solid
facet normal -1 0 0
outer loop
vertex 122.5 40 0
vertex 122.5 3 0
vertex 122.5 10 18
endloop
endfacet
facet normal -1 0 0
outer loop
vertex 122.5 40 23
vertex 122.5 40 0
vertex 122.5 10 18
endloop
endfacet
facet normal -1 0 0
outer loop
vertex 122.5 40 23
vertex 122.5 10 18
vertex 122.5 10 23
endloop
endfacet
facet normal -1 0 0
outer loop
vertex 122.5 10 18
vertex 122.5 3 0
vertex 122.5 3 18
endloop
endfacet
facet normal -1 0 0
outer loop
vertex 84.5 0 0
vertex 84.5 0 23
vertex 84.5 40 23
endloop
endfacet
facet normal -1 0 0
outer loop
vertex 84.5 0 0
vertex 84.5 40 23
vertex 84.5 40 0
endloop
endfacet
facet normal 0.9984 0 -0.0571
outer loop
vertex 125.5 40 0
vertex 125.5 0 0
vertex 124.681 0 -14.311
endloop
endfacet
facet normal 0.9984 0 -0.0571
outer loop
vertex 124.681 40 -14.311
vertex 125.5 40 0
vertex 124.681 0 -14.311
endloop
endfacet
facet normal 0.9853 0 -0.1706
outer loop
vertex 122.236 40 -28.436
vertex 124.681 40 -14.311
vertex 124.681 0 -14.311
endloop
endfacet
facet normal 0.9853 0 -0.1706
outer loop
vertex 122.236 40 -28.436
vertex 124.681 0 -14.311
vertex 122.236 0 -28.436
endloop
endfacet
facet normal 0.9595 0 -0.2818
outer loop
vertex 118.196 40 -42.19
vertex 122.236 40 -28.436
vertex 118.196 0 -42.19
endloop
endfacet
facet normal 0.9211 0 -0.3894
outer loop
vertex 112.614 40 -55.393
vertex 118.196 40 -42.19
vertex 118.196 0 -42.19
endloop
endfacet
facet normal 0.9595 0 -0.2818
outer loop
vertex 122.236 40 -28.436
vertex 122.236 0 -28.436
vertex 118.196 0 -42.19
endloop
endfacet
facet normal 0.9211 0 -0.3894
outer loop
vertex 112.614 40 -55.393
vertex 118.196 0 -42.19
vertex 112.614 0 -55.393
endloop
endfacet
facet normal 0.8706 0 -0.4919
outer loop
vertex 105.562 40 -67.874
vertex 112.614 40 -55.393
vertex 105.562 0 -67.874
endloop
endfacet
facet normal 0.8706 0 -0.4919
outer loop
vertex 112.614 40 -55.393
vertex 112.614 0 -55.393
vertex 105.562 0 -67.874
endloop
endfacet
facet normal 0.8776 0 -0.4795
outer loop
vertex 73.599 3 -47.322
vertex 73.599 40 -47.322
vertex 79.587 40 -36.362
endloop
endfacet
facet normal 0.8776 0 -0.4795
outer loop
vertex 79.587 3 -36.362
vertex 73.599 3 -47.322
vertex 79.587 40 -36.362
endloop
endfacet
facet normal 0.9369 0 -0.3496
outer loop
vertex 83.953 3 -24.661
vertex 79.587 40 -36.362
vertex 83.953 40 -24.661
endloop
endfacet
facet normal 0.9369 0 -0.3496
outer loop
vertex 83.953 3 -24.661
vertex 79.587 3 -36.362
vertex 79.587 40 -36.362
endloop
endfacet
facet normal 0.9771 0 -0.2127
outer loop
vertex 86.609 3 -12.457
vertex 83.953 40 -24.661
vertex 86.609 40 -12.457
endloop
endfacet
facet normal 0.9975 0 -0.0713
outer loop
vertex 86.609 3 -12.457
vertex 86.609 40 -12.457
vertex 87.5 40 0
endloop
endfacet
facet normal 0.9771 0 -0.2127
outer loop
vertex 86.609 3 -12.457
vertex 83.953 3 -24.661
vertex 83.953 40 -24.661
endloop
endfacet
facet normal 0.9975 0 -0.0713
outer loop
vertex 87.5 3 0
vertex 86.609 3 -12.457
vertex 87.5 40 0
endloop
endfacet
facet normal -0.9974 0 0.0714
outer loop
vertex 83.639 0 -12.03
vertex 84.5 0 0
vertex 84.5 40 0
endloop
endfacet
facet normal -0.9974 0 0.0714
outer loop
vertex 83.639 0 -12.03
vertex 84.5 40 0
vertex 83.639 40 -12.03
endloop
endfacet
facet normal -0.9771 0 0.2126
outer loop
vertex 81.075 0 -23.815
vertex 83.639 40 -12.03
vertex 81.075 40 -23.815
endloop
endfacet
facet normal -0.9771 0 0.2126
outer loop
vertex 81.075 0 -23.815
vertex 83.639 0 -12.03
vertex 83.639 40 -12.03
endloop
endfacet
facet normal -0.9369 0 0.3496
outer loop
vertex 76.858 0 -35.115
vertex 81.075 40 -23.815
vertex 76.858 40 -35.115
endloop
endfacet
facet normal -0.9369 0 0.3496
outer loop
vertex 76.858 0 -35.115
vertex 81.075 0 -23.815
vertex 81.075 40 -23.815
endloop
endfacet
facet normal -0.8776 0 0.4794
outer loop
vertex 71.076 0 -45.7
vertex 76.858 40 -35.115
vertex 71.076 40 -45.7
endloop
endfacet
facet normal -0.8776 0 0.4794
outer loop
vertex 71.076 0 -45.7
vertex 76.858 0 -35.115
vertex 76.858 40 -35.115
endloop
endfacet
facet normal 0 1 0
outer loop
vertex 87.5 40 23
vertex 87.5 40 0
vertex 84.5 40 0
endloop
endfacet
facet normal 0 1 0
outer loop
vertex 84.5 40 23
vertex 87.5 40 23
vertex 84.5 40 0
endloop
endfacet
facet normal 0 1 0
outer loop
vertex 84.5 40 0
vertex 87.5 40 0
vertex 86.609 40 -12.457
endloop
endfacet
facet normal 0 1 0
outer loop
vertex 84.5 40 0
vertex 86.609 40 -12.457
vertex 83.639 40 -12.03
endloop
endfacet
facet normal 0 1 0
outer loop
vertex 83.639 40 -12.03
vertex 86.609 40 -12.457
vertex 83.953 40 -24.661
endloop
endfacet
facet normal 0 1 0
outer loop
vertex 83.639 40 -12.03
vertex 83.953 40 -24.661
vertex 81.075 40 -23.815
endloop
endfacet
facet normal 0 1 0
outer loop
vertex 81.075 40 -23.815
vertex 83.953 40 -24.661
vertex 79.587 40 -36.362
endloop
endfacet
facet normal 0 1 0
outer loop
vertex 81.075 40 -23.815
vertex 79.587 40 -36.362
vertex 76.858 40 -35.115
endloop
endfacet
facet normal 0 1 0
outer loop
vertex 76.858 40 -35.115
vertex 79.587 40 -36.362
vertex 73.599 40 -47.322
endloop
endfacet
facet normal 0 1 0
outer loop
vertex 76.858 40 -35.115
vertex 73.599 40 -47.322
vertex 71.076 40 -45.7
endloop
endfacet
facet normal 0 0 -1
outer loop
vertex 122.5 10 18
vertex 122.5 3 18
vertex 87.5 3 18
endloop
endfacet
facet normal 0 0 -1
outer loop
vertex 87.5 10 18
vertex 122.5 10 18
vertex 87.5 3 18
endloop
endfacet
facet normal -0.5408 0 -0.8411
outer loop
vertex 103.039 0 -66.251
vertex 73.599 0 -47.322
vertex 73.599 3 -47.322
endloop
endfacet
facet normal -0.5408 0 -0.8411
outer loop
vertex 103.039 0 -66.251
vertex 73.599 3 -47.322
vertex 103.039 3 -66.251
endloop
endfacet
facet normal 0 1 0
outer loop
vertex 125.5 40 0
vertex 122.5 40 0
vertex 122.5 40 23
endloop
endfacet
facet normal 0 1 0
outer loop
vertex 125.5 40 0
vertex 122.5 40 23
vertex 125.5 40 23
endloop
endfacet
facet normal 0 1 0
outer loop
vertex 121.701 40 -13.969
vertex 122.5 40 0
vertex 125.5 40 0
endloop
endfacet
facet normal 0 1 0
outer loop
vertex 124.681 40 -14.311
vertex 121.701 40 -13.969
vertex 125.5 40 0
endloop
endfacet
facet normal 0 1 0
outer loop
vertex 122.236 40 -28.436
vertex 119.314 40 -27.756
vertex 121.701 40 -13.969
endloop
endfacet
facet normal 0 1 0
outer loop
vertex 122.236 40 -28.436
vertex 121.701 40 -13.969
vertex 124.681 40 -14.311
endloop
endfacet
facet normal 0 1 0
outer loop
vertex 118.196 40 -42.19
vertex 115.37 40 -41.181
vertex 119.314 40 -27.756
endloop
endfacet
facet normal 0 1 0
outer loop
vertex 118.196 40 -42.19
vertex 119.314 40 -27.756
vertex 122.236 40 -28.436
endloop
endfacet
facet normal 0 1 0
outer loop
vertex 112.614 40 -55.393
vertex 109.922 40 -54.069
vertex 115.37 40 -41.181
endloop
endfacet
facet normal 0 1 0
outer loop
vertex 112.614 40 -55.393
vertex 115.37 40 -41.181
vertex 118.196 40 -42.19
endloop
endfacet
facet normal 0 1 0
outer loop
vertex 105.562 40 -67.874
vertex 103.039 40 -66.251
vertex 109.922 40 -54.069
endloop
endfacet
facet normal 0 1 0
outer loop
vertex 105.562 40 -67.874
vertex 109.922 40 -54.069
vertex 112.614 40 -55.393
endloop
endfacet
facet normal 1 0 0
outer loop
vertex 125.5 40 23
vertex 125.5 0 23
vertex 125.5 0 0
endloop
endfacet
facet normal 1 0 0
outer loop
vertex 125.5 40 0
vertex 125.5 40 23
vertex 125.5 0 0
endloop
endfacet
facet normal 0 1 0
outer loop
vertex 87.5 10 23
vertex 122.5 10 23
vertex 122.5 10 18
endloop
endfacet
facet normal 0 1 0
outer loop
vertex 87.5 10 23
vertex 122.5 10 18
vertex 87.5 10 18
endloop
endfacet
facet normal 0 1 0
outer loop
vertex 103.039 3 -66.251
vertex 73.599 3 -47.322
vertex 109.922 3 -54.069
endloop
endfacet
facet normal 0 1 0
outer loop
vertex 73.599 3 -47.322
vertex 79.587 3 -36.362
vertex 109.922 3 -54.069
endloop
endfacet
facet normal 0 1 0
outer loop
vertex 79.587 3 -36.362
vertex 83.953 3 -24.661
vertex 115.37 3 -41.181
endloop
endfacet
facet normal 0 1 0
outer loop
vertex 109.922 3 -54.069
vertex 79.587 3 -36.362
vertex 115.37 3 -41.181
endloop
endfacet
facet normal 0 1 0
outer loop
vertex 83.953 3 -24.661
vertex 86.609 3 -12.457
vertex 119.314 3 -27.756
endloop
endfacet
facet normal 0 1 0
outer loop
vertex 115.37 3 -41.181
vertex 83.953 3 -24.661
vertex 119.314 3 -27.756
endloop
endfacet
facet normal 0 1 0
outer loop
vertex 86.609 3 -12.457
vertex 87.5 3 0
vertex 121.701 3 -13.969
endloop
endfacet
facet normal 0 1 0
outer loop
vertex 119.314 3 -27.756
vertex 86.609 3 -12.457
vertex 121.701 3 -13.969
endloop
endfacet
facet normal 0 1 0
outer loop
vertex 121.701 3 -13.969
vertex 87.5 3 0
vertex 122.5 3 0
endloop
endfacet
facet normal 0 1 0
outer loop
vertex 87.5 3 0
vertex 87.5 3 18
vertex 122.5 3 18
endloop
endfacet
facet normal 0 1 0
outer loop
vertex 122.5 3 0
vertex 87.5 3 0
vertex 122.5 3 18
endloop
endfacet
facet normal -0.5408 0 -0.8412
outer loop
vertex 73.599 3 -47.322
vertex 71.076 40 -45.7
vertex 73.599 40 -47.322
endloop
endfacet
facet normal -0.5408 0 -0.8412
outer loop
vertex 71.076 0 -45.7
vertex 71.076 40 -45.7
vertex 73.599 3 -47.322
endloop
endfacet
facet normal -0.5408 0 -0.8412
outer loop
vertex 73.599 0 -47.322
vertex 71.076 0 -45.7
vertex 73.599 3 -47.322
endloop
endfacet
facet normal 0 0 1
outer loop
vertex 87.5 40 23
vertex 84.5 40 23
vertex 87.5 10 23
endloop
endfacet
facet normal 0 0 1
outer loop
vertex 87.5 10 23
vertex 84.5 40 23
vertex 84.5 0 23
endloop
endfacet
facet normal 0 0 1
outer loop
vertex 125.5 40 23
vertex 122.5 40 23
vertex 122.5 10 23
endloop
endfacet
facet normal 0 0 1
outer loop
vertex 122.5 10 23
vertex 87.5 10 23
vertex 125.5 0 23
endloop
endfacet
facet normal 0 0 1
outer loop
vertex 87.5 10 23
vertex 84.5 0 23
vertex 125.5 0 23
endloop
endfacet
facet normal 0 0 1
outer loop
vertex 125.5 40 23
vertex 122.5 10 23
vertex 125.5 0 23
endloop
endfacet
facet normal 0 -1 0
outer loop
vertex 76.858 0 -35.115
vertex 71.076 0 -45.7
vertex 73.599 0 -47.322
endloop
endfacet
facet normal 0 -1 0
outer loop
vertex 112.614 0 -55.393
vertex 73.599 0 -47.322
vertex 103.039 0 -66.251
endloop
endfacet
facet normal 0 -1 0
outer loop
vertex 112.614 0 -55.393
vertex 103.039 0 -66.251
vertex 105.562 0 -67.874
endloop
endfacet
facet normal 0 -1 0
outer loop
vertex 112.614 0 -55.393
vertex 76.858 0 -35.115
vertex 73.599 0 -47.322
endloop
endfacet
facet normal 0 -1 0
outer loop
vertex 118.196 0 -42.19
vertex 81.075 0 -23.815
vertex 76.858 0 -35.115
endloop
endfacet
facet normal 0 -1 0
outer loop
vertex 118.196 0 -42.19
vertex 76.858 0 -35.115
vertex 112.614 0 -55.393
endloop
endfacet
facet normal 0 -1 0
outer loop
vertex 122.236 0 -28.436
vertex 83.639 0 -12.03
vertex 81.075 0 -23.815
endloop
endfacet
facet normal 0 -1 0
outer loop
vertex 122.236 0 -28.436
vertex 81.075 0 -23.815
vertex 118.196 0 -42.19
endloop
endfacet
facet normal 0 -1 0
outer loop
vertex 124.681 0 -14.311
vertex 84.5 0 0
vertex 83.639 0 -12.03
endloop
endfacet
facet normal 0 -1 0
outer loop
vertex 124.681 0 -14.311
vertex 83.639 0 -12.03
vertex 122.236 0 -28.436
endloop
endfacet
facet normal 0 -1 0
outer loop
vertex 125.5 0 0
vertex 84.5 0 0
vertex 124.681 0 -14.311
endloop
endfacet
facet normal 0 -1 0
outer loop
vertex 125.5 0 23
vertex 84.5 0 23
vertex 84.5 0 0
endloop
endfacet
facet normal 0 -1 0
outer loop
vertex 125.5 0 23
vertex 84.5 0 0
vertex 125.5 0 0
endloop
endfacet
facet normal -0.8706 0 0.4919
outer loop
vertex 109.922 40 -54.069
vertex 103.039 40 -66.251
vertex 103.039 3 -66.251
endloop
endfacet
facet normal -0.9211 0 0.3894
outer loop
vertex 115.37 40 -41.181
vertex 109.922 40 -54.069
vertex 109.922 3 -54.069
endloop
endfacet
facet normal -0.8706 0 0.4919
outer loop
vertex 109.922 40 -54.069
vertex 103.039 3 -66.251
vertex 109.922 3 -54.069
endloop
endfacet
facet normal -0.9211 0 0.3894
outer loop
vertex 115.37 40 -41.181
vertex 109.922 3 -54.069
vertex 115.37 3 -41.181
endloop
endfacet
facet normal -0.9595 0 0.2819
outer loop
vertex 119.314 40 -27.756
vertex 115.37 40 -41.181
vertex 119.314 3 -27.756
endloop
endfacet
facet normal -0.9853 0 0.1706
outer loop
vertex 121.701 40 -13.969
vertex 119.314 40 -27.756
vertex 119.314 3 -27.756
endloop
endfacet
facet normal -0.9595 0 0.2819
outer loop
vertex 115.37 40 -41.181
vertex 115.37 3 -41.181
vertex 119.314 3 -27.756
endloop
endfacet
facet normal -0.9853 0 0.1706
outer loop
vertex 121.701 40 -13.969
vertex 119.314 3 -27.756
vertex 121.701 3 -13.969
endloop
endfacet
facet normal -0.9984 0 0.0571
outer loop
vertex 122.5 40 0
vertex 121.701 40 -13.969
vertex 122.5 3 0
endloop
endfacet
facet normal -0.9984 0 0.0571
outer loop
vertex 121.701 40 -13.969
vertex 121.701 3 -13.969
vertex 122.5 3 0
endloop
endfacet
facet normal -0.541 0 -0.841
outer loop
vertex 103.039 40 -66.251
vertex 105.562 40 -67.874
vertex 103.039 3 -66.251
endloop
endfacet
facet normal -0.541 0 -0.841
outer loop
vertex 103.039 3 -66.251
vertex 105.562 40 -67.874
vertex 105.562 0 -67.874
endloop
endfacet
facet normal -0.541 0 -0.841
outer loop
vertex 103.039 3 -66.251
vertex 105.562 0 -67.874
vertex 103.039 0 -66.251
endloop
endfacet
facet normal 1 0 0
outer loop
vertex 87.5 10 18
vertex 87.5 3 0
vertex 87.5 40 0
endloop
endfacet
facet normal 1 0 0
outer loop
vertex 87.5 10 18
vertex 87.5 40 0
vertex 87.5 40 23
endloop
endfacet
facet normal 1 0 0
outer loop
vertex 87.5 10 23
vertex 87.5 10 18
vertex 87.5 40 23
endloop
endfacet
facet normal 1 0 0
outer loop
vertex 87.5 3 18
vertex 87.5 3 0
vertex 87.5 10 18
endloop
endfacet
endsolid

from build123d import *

# Parameters (mm, degrees)
BOSS_EXTRUDE1_DEPTH   = 40
BOSS_EXTRUDE1_2_DEPTH = 40
BOSS_EXTRUDE2_DEPTH   = 10
BOSS_EXTRUDE3_DEPTH   = 3


with BuildPart() as part:
    # Sketch1 → Boss-Extrude1 (new body)
    with BuildSketch(Plane(origin=(0, 0, 0), x_dir=(1, 0, 0), z_dir=(0, 1, 0))):
        with BuildLine():
            Line((87.5, 0), (87.5, -20))
            Line((87.5, -20), (87.5, -23))
            Line((87.5, -23), (84.5, -23))
            Line((84.5, -23), (84.5, 0))
            ThreePointArc((84.5, 0), (81.074511679, 23.815405855), (71.075773822, 45.699938464))
            Line((71.075773822, 45.699938464), (73.599174076, 47.322421486))
            ThreePointArc((73.599174076, 47.322421486), (83.952896709, 24.660923222), (87.5, 0))
        make_face()
    extrude(amount=BOSS_EXTRUDE1_DEPTH)



with BuildPart() as body_2:
    # Sketch1 → Boss-Extrude1 2 (new body)
    with BuildSketch(Plane(origin=(0, 0, 0), x_dir=(1, 0, 0), z_dir=(0, 1, 0))):
        with BuildLine():
            Line((122.5, 0), (122.5, -20))
            Line((122.5, -20), (122.5, -23))
            Line((122.5, -23), (125.5, -23))
            Line((125.5, -23), (125.5, 0))
            ThreePointArc((125.5, 0), (120.412440423, 35.370809879), (105.56224396, 67.873873103))
            Line((105.56224396, 67.873873103), (103.038843706, 66.251390081))
            ThreePointArc((103.038843706, 66.251390081), (117.534055393, 34.525292511), (122.5, 0))
        make_face()
    extrude(amount=BOSS_EXTRUDE1_2_DEPTH)


with BuildPart() as part_1:
    add(part.part)

    add(body_2.part)  # Boss-Extrude2 merges body 2
    # Sketch2 → Boss-Extrude2 (add)
    with BuildSketch(Plane.XZ):
        Polygon((87.5, 23), (122.5, 23), (122.5, 18), (87.482549511, 18), align=None)
    extrude(amount=-BOSS_EXTRUDE2_DEPTH)

    # Sketch3 → Boss-Extrude3 (add)
    with BuildSketch(Plane.XZ):
        with BuildLine():
            Line((73.599174076, -47.322421486), (103.038843706, -66.251390081))
            ThreePointArc((103.038843706, -66.251390081), (117.534055393, -34.525292511), (122.5, 0))
            Line((122.5, 0), (122.5, 18))
            Line((122.5, 18), (87.5, 18))
            Line((87.5, 18), (87.5, 0))
            ThreePointArc((87.5, 0), (83.952896709, -24.660923222), (73.599174076, -47.322421486))
        make_face()
    extrude(amount=-BOSS_EXTRUDE3_DEPTH)


solid = part_1.part
